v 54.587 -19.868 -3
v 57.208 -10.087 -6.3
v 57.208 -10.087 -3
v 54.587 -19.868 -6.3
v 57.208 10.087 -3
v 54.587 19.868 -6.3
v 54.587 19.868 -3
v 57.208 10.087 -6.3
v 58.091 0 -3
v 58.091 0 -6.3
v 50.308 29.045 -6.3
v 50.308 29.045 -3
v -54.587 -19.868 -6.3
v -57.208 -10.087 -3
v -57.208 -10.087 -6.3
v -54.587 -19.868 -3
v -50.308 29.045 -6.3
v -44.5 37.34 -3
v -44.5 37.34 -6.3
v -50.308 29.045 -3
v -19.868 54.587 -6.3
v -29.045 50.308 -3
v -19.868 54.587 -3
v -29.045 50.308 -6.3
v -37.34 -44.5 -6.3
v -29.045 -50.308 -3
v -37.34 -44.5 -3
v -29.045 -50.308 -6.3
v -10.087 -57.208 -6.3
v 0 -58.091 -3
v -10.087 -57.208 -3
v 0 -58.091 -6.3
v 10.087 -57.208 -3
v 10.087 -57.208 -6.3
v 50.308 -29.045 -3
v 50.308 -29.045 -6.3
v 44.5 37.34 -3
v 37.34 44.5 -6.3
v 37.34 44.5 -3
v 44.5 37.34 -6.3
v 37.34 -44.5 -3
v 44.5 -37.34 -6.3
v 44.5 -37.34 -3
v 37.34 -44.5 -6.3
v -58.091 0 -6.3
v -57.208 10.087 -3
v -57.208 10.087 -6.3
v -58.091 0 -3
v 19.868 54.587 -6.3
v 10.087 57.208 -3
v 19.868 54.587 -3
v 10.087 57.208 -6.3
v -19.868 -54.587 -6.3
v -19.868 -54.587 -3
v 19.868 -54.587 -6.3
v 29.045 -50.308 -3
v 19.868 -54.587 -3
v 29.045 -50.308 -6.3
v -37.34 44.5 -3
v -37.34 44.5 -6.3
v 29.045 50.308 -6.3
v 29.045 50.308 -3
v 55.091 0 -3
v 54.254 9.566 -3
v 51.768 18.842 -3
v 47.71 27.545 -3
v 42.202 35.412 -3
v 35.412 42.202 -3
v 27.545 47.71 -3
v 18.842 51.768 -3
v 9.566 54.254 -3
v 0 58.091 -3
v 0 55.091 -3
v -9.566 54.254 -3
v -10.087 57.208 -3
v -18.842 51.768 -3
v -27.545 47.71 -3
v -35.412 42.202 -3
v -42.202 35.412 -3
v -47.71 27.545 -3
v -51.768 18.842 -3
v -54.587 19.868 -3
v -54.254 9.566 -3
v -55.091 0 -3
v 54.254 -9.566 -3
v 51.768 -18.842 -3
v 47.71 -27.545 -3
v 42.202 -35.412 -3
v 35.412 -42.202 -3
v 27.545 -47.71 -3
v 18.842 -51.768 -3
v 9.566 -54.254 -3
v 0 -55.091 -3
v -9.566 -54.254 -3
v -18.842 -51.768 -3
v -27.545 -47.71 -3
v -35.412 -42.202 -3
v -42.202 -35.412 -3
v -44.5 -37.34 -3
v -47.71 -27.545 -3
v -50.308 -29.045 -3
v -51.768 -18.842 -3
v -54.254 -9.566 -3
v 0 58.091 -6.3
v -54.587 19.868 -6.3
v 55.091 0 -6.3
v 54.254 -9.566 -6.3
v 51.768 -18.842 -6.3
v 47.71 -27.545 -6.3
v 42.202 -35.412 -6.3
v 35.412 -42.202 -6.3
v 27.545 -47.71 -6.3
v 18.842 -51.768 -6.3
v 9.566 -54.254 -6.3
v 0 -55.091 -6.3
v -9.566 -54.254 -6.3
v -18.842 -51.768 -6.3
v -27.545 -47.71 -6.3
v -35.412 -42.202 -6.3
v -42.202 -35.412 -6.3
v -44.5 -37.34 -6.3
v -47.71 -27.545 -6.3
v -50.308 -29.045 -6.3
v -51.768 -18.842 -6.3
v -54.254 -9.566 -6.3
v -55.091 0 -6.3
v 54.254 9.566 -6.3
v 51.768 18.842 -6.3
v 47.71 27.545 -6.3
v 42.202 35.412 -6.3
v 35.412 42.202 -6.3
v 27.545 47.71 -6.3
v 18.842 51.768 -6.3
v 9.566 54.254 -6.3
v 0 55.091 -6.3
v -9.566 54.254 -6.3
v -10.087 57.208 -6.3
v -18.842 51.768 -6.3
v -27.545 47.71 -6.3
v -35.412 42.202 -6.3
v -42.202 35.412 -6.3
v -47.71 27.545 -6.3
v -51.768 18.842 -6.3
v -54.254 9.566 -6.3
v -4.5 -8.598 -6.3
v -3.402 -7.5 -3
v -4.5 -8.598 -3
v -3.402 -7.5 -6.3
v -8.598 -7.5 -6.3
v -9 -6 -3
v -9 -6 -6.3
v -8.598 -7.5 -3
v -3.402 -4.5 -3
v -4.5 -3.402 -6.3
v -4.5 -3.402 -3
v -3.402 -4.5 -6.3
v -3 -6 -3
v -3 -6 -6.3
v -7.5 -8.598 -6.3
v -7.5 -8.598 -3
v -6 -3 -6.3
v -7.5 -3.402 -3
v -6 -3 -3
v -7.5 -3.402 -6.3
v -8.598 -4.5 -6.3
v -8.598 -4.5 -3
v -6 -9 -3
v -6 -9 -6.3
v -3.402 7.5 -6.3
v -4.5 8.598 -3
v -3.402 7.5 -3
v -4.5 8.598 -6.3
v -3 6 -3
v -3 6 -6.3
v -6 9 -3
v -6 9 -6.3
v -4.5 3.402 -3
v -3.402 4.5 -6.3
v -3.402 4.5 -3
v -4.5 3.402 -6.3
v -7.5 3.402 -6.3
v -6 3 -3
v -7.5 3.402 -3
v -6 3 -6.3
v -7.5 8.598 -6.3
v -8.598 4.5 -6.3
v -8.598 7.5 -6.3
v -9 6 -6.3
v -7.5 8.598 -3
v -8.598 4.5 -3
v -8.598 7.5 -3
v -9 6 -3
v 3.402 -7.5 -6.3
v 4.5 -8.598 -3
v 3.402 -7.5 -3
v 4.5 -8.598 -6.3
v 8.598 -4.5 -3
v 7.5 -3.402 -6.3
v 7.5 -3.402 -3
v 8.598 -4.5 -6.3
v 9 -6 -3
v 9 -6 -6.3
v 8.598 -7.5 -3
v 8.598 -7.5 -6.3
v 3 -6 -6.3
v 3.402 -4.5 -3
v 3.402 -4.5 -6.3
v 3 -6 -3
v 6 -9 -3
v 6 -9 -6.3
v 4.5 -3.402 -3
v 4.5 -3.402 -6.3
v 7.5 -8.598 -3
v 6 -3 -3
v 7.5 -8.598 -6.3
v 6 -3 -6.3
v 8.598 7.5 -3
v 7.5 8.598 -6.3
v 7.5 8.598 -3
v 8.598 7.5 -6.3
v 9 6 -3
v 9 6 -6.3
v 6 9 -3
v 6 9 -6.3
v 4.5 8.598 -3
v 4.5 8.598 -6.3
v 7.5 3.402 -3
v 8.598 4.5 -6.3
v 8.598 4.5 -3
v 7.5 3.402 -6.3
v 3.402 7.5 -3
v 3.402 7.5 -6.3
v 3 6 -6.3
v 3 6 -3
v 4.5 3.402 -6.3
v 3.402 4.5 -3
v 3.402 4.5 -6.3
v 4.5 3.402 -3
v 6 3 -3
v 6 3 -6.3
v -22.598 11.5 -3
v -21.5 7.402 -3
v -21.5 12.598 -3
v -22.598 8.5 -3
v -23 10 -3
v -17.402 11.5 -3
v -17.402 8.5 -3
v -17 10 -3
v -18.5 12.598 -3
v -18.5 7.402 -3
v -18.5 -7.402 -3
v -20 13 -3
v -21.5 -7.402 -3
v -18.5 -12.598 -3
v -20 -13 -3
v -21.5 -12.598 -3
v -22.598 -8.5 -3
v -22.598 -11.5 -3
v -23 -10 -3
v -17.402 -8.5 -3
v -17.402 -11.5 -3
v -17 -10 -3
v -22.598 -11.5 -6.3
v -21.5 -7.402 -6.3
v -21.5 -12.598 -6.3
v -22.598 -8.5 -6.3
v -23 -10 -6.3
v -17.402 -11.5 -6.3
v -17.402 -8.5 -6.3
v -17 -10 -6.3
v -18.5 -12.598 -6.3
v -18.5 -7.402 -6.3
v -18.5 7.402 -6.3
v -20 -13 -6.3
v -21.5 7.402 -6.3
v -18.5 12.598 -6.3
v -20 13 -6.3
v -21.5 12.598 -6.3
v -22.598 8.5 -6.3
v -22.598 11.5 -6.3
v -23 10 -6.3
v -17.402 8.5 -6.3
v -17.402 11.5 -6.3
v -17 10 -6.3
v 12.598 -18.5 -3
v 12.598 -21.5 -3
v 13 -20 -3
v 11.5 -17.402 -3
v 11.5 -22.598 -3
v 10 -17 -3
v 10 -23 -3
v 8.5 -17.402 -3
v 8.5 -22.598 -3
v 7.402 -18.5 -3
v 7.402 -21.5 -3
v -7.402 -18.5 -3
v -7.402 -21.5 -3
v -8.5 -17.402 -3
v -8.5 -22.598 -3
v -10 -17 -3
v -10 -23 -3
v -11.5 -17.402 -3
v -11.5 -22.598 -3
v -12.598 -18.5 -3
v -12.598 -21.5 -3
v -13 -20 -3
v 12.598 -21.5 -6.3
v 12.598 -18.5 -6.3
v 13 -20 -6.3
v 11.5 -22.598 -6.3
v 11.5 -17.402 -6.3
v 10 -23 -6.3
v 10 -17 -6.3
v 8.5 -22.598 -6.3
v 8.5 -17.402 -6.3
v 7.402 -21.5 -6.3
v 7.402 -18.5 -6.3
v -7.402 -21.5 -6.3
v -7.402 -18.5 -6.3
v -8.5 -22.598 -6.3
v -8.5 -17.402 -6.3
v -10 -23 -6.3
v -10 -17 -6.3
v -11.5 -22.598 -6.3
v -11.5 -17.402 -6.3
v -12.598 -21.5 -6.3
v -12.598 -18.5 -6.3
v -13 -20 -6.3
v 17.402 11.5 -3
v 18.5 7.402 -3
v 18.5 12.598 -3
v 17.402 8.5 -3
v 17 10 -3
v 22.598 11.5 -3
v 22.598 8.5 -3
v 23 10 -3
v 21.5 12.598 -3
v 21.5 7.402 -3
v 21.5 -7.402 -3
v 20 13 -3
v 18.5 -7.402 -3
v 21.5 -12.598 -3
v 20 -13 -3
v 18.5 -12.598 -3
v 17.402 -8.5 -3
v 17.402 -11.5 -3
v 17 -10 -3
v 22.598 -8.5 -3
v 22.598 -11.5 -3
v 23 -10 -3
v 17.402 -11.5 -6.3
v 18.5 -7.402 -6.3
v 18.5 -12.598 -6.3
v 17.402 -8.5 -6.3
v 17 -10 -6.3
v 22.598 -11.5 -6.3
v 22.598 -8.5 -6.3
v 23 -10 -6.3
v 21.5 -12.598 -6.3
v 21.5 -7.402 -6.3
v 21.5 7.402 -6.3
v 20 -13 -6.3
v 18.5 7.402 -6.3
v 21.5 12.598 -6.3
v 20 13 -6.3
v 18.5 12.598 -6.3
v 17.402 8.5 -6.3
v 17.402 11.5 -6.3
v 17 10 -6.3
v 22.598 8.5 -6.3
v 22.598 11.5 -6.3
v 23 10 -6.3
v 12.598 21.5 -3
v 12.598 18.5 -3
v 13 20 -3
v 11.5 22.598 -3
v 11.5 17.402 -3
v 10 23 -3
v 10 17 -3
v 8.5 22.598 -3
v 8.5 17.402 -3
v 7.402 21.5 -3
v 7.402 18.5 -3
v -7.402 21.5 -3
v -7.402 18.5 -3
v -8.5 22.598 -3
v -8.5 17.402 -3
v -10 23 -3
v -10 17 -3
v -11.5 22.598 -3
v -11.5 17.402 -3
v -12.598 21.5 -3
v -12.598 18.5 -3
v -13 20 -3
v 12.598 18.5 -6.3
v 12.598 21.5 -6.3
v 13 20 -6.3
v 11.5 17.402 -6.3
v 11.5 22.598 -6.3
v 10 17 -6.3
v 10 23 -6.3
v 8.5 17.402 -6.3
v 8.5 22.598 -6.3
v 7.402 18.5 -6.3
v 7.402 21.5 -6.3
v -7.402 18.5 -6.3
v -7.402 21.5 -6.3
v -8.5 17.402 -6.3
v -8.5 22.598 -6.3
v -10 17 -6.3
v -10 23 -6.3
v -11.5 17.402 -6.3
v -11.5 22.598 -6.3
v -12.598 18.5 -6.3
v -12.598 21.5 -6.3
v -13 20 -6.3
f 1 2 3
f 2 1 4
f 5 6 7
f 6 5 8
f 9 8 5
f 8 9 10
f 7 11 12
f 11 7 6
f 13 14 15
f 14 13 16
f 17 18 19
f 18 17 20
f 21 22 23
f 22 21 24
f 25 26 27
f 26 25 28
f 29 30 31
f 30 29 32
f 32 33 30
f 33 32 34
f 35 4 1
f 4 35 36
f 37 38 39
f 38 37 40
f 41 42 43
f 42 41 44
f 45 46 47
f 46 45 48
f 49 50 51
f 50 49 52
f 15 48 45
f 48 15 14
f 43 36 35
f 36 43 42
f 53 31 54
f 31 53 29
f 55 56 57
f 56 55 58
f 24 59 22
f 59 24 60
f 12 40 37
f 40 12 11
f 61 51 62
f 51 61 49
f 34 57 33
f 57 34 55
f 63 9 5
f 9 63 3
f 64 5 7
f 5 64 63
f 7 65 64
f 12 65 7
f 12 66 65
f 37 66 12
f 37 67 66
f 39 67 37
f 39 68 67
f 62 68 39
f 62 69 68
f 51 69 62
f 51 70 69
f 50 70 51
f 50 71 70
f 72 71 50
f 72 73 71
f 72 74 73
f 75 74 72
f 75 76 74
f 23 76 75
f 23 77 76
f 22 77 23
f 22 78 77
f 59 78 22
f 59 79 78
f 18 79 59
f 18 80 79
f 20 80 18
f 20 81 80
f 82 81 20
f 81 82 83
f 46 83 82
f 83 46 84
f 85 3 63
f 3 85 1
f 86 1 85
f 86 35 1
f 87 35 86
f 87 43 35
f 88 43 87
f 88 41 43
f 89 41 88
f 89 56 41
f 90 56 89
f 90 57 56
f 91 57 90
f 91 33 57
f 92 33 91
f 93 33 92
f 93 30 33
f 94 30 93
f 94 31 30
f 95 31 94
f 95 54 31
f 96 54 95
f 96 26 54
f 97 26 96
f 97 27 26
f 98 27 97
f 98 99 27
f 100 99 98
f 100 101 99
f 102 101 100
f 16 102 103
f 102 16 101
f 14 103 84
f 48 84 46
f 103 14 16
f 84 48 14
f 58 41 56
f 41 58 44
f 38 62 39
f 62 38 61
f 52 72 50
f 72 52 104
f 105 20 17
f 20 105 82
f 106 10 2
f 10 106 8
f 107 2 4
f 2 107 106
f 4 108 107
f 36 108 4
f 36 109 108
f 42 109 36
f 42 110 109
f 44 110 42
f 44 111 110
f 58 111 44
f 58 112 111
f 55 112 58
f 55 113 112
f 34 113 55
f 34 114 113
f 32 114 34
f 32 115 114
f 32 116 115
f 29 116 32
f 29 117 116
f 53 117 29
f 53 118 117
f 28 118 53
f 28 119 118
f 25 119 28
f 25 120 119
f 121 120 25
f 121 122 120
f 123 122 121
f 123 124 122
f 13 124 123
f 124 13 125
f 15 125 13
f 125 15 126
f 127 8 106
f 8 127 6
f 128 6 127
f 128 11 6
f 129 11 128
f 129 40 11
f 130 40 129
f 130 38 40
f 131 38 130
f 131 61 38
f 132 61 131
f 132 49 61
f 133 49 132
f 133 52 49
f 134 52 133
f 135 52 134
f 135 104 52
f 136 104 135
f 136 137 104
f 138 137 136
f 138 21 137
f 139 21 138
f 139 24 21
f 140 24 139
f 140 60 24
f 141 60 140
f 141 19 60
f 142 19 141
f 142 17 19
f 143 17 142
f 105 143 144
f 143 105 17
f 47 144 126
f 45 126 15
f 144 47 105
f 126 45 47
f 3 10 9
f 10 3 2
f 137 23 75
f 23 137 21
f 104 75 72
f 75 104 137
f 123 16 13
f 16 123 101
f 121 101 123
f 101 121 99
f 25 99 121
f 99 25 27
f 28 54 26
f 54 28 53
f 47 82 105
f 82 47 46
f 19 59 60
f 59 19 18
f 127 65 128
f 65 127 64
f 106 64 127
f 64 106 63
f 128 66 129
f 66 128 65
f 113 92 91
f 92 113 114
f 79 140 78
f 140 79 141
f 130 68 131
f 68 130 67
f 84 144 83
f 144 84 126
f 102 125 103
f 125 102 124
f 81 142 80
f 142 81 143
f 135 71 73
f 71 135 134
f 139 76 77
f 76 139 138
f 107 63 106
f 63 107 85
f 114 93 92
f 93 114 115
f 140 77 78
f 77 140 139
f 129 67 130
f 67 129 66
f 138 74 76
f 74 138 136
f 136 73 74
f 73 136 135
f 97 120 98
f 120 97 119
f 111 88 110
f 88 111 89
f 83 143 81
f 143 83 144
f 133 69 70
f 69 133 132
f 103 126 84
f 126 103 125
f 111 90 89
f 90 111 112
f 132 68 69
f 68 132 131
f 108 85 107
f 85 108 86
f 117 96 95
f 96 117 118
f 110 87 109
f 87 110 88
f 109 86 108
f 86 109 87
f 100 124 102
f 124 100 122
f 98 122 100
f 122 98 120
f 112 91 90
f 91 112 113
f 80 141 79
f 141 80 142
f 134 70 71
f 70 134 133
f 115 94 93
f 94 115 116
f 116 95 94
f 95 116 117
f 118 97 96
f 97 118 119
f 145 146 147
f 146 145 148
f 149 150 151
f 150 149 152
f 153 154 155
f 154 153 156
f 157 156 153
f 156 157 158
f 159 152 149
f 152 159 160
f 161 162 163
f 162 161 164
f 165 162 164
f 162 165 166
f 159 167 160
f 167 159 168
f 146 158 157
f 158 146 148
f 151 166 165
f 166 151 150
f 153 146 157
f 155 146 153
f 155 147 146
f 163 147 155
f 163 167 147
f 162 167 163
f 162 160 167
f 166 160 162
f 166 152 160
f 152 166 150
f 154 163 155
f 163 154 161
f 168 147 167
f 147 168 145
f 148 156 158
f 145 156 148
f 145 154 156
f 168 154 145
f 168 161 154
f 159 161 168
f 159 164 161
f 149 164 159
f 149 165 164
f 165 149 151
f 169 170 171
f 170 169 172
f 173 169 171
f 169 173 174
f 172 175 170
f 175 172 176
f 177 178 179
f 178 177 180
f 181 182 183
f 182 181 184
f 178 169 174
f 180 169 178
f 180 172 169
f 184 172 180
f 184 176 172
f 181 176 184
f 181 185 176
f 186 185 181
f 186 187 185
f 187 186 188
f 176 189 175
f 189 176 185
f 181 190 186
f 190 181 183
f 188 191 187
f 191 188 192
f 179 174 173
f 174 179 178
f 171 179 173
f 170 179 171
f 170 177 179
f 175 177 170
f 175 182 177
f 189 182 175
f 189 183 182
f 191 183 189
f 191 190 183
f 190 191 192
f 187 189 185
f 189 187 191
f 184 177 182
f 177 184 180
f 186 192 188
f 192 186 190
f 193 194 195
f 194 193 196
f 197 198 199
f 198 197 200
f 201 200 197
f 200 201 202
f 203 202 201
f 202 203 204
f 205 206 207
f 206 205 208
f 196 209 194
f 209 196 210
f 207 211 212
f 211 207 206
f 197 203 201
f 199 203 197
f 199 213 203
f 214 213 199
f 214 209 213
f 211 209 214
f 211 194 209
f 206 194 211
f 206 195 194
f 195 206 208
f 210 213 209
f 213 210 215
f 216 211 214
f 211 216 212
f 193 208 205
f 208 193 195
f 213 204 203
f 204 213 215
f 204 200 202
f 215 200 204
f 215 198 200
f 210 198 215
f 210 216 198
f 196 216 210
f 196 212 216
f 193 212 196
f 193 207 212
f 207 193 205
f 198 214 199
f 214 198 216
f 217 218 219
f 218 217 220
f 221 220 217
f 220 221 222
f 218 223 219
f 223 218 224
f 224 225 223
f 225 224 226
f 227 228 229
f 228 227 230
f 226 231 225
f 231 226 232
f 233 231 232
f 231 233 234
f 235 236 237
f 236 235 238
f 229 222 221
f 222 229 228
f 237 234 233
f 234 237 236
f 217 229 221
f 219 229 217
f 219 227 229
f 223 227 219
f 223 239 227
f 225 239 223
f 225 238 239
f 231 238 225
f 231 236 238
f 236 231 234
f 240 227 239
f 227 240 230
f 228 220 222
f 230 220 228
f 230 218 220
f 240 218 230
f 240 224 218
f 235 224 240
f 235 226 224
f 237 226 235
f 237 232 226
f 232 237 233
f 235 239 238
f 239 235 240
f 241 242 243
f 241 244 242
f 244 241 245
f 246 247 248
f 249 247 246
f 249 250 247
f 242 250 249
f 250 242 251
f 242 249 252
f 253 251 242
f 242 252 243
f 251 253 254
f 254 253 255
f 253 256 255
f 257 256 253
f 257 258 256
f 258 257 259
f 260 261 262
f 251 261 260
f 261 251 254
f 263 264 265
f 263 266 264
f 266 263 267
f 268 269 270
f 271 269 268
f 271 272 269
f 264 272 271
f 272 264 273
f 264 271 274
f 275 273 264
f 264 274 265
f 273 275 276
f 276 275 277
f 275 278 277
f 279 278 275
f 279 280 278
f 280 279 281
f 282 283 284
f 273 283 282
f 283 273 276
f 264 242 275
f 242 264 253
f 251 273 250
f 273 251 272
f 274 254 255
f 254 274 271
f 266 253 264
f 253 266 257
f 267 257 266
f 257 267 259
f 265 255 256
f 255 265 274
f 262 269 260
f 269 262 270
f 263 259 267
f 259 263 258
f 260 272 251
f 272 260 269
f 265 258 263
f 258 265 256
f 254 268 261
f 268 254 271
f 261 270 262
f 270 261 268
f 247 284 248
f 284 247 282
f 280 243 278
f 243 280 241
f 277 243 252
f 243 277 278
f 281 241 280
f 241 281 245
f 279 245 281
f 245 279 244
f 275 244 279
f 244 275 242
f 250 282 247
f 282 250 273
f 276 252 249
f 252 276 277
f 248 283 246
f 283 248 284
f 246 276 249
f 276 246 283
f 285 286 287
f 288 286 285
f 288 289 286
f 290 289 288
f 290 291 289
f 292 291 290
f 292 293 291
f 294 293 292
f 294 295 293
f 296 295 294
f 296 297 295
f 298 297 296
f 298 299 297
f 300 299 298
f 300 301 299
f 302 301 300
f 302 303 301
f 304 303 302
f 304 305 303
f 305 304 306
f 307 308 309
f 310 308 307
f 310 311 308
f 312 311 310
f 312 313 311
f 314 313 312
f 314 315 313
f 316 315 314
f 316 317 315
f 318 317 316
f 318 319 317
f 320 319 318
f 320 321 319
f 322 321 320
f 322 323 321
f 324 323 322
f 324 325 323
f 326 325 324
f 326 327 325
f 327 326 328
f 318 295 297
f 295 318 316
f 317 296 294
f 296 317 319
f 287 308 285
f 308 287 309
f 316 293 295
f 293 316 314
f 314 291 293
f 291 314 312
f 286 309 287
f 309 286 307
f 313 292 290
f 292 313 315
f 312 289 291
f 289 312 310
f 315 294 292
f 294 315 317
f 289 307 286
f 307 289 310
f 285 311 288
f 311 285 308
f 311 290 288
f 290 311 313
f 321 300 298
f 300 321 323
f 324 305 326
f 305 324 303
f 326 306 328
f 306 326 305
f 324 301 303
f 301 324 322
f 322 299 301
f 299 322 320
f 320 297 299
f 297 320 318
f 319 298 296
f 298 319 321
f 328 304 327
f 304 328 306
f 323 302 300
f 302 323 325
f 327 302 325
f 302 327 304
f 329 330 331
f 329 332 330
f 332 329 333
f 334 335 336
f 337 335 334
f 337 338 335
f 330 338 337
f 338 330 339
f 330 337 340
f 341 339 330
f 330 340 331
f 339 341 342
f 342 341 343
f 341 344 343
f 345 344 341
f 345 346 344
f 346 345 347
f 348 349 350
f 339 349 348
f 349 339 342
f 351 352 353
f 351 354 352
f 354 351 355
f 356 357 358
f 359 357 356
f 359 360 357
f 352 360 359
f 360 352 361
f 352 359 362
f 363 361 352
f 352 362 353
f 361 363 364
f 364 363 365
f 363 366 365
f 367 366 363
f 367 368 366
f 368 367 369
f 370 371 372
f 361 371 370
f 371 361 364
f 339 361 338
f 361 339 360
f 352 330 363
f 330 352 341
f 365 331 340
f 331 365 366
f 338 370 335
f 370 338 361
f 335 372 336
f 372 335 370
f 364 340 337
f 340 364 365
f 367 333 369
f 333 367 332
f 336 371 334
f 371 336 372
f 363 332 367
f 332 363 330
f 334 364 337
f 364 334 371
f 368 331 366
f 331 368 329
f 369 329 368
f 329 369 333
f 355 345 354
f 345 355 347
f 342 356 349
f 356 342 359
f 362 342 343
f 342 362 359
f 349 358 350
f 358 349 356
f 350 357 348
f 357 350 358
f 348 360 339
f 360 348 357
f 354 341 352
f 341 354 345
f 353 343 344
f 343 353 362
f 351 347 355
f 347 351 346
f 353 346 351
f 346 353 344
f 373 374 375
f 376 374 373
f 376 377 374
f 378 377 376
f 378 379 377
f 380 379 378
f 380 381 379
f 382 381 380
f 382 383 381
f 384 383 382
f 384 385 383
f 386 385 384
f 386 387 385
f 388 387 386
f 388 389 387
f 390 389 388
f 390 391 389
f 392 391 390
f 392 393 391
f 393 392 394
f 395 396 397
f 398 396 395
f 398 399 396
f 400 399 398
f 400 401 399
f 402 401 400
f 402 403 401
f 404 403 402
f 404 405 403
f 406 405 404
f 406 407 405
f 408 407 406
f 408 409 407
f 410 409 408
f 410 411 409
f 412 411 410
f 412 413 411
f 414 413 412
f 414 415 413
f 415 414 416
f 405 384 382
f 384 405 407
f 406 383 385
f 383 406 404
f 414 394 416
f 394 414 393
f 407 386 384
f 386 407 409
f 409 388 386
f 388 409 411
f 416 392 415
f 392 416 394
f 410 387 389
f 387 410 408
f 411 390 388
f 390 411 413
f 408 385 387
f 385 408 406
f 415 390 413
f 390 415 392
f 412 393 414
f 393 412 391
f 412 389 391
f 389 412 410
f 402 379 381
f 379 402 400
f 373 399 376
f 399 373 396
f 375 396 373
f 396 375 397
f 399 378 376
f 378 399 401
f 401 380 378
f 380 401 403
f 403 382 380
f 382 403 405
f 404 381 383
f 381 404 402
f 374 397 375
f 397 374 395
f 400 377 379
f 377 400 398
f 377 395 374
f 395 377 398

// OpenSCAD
$fn = 36;

render = "verbinder";

kugel_fn = $fn/3;
l = 360;
h = 6;
boden = 1;

r = 14/2;
lk = l/2 - 2.3*r;

start_r = 30;
start_lk = 205;

// Karten sind 45x73.5
card_w = 45;
card_h = 73.5;
card_diag = sqrt(card_w^2 + card_h^2);

first = 0.2; // first layer height
//zier_pkt_d = 1.2; // 4* first layer extrusion width @ 0.25n
zier_pkt_d = 1.8; // 4* first layer extrusion width @ 0.4n
zier_lk = lk + r + 0.9;

//zier_linie = 0.6; // 2* first layer extrusion width @ 0.25n
zier_linie = 1.35; // 3* first layer extrusion width @ 0.4n

verb_u = 0.3;
verb_d = 3;
verb_a = 5;
verb_l = 20;

module brett(){
    difference(){
        translate([-l/2, -l/2, -h]) cube([l,l,h]);
        
        // Kreis
        for(i = [0:63]){
            translate([lk*sin((i+.5)*360/64), lk*cos((i+.5)*360/64), boden+r-h]) kugel();
        }
        
        // Start
        for(i = [0:3]){
            translate([start_lk*sin((i+.5)*360/4), start_lk*cos((i+.5)*360/4), boden]) union(){
                translate([0,0,-h]) cylinder(h=h, r=start_r-r);
                rotate_extrude() translate([start_r-r, 0, 0]) circle(r, $fn = kugel_fn);
                translate([0,0,-boden-h]) cylinder(h=boden,r=start_r);
            }
        }
        
        // Mitte
        translate([0,0,boden-h]){
            cylinder(h=h, d=card_diag);
            translate([0,0,h-boden]) rotate_extrude() translate([card_diag/2,0,0]) circle(r=h, $fn = kugel_fn);
            translate([0,0,-boden]) cylinder(h=boden,d=card_diag+2*r);
        }

        // Häuser
        for(i = [0, 16, 32, 48]){
            for(j = [1:4]){
                this_lk = lk - 3*j*r;
                translate([this_lk*sin((i-.5)*360/64-0.8*j), this_lk*cos((i-.5)*360/64-0.8*j), boden+r-h]) kugel();
            }
        }

        // Zierlinien
        zier();
        
        // Verbinder
        verbinder_zentrum();
        verbinder_ecke();
        verbinder_kante();
    }
    
}

module zier(){
    // Kreis abzählbar machen
    for(i = [0:63]){
        if(i%2){
            translate([zier_lk*sin((i+.5)*360/64), zier_lk*cos((i+.5)*360/64), -first]) cylinder(h=first, d=zier_pkt_d);
        }
    }

    // Häuser
    for(i = [0, 16, 32, 48]){
        for(j = [1:4]){
            this_lk = lk - 3*j*r;
            difference(){
                translate([this_lk*sin((i-.5)*360/64-0.8*j), this_lk*cos((i-.5)*360/64-0.8*j), -first]) cylinder(h=first, r=sqrt(2*r*(h-boden) - (h-boden)^2)+zier_linie);
                translate([this_lk*sin((i-.5)*360/64-0.8*j), this_lk*cos((i-.5)*360/64-0.8*j), boden+r-h]) kugel();
            }
        }
    }
    
    // Start
    for(i = [0:3]){
        translate([start_lk*sin((i+.5)*360/4), start_lk*cos((i+.5)*360/4), -first]) difference(){
            cylinder(h=first, r=start_r+zier_linie);
            cylinder(h=first, r=start_r-r);
            rotate_extrude() translate([start_r-r, 0, 0]) circle(r, $fn = kugel_fn);
        }
    }
}

module verbinder_zentrum(){
    translate([0,0,-h-verb_u]) difference(){
        cylinder(h=h/2+verb_u, d=card_diag+2*r+2*verb_d+2*verb_a);
        cylinder(h=h/2+verb_u, d=card_diag+2*r+2*verb_a);
    }
}

module verbinder_ecke(multi = true, $fn = kugel_fn){
    if(multi){
        for(x = [-1,1]) for(y = [-1,1]){
            translate([x*(l/2 - verb_a - verb_d), y*(l/2 - verb_a - verb_d), -h-verb_u]) cylinder(h=h/2+verb_u, r=verb_d);
        }
    } else {
        for(x = [-1,1]) for(y = [-1,1]){
            translate([x*(2*verb_d), y*(2*verb_d), -h-verb_u]) cylinder(h=h/2+verb_u, r=verb_d);
        }
    }
}

module verbinder_kante(multi = true, $fn = kugel_fn){
    if(multi){
        for(i = [90:90:360]){
            rotate([0,0,i]) translate([0, l/2 - verb_a - verb_d, -h-verb_u]){
                translate([-verb_l/2, -verb_d/2, 0]) cube([verb_l, verb_d, h/2+verb_u]);
                translate([-verb_l/2, 0, 0]) cylinder(d=verb_d*2, h=h/2+verb_u);
                translate([+verb_l/2, 0, 0]) cylinder(d=verb_d*2, h=h/2+verb_u);
            }
        }
    } else {
        for(i = [90:90:360]){
            rotate([0,0,i]) translate([0,verb_l,0]){
                translate([-verb_l/2, -verb_d/2, -h-verb_u]) cube([verb_l, verb_d, h/2+verb_u]);
                translate([-verb_l/2, 0, -h-verb_u]) cylinder(d=verb_d*2, h=h/2+verb_u);
                translate([+verb_l/2, 0, -h-verb_u]) cylinder(d=verb_d*2, h=h/2+verb_u);
            }
        }
    }
}

module kugel(){
    render() intersection(){
        sphere(r, $fn = kugel_fn);
        translate([-r, -r, -2*r]) cube(2*r);
    }
}

if(render == "zier"){
    intersection(){
        zier();
        translate([0,0,-h-verb_u]) cube([l/2, l/2, h+verb_u]);
    }
} else if(render == "brett"){
    intersection(){
        brett();
        translate([0,0,-h-verb_u]) cube([l/2, l/2, h+verb_u]);
    }
} else if(render == "verbinder"){
    verbinder_zentrum();
    verbinder_ecke(multi=false);
    verbinder_kante(multi=false);
}
